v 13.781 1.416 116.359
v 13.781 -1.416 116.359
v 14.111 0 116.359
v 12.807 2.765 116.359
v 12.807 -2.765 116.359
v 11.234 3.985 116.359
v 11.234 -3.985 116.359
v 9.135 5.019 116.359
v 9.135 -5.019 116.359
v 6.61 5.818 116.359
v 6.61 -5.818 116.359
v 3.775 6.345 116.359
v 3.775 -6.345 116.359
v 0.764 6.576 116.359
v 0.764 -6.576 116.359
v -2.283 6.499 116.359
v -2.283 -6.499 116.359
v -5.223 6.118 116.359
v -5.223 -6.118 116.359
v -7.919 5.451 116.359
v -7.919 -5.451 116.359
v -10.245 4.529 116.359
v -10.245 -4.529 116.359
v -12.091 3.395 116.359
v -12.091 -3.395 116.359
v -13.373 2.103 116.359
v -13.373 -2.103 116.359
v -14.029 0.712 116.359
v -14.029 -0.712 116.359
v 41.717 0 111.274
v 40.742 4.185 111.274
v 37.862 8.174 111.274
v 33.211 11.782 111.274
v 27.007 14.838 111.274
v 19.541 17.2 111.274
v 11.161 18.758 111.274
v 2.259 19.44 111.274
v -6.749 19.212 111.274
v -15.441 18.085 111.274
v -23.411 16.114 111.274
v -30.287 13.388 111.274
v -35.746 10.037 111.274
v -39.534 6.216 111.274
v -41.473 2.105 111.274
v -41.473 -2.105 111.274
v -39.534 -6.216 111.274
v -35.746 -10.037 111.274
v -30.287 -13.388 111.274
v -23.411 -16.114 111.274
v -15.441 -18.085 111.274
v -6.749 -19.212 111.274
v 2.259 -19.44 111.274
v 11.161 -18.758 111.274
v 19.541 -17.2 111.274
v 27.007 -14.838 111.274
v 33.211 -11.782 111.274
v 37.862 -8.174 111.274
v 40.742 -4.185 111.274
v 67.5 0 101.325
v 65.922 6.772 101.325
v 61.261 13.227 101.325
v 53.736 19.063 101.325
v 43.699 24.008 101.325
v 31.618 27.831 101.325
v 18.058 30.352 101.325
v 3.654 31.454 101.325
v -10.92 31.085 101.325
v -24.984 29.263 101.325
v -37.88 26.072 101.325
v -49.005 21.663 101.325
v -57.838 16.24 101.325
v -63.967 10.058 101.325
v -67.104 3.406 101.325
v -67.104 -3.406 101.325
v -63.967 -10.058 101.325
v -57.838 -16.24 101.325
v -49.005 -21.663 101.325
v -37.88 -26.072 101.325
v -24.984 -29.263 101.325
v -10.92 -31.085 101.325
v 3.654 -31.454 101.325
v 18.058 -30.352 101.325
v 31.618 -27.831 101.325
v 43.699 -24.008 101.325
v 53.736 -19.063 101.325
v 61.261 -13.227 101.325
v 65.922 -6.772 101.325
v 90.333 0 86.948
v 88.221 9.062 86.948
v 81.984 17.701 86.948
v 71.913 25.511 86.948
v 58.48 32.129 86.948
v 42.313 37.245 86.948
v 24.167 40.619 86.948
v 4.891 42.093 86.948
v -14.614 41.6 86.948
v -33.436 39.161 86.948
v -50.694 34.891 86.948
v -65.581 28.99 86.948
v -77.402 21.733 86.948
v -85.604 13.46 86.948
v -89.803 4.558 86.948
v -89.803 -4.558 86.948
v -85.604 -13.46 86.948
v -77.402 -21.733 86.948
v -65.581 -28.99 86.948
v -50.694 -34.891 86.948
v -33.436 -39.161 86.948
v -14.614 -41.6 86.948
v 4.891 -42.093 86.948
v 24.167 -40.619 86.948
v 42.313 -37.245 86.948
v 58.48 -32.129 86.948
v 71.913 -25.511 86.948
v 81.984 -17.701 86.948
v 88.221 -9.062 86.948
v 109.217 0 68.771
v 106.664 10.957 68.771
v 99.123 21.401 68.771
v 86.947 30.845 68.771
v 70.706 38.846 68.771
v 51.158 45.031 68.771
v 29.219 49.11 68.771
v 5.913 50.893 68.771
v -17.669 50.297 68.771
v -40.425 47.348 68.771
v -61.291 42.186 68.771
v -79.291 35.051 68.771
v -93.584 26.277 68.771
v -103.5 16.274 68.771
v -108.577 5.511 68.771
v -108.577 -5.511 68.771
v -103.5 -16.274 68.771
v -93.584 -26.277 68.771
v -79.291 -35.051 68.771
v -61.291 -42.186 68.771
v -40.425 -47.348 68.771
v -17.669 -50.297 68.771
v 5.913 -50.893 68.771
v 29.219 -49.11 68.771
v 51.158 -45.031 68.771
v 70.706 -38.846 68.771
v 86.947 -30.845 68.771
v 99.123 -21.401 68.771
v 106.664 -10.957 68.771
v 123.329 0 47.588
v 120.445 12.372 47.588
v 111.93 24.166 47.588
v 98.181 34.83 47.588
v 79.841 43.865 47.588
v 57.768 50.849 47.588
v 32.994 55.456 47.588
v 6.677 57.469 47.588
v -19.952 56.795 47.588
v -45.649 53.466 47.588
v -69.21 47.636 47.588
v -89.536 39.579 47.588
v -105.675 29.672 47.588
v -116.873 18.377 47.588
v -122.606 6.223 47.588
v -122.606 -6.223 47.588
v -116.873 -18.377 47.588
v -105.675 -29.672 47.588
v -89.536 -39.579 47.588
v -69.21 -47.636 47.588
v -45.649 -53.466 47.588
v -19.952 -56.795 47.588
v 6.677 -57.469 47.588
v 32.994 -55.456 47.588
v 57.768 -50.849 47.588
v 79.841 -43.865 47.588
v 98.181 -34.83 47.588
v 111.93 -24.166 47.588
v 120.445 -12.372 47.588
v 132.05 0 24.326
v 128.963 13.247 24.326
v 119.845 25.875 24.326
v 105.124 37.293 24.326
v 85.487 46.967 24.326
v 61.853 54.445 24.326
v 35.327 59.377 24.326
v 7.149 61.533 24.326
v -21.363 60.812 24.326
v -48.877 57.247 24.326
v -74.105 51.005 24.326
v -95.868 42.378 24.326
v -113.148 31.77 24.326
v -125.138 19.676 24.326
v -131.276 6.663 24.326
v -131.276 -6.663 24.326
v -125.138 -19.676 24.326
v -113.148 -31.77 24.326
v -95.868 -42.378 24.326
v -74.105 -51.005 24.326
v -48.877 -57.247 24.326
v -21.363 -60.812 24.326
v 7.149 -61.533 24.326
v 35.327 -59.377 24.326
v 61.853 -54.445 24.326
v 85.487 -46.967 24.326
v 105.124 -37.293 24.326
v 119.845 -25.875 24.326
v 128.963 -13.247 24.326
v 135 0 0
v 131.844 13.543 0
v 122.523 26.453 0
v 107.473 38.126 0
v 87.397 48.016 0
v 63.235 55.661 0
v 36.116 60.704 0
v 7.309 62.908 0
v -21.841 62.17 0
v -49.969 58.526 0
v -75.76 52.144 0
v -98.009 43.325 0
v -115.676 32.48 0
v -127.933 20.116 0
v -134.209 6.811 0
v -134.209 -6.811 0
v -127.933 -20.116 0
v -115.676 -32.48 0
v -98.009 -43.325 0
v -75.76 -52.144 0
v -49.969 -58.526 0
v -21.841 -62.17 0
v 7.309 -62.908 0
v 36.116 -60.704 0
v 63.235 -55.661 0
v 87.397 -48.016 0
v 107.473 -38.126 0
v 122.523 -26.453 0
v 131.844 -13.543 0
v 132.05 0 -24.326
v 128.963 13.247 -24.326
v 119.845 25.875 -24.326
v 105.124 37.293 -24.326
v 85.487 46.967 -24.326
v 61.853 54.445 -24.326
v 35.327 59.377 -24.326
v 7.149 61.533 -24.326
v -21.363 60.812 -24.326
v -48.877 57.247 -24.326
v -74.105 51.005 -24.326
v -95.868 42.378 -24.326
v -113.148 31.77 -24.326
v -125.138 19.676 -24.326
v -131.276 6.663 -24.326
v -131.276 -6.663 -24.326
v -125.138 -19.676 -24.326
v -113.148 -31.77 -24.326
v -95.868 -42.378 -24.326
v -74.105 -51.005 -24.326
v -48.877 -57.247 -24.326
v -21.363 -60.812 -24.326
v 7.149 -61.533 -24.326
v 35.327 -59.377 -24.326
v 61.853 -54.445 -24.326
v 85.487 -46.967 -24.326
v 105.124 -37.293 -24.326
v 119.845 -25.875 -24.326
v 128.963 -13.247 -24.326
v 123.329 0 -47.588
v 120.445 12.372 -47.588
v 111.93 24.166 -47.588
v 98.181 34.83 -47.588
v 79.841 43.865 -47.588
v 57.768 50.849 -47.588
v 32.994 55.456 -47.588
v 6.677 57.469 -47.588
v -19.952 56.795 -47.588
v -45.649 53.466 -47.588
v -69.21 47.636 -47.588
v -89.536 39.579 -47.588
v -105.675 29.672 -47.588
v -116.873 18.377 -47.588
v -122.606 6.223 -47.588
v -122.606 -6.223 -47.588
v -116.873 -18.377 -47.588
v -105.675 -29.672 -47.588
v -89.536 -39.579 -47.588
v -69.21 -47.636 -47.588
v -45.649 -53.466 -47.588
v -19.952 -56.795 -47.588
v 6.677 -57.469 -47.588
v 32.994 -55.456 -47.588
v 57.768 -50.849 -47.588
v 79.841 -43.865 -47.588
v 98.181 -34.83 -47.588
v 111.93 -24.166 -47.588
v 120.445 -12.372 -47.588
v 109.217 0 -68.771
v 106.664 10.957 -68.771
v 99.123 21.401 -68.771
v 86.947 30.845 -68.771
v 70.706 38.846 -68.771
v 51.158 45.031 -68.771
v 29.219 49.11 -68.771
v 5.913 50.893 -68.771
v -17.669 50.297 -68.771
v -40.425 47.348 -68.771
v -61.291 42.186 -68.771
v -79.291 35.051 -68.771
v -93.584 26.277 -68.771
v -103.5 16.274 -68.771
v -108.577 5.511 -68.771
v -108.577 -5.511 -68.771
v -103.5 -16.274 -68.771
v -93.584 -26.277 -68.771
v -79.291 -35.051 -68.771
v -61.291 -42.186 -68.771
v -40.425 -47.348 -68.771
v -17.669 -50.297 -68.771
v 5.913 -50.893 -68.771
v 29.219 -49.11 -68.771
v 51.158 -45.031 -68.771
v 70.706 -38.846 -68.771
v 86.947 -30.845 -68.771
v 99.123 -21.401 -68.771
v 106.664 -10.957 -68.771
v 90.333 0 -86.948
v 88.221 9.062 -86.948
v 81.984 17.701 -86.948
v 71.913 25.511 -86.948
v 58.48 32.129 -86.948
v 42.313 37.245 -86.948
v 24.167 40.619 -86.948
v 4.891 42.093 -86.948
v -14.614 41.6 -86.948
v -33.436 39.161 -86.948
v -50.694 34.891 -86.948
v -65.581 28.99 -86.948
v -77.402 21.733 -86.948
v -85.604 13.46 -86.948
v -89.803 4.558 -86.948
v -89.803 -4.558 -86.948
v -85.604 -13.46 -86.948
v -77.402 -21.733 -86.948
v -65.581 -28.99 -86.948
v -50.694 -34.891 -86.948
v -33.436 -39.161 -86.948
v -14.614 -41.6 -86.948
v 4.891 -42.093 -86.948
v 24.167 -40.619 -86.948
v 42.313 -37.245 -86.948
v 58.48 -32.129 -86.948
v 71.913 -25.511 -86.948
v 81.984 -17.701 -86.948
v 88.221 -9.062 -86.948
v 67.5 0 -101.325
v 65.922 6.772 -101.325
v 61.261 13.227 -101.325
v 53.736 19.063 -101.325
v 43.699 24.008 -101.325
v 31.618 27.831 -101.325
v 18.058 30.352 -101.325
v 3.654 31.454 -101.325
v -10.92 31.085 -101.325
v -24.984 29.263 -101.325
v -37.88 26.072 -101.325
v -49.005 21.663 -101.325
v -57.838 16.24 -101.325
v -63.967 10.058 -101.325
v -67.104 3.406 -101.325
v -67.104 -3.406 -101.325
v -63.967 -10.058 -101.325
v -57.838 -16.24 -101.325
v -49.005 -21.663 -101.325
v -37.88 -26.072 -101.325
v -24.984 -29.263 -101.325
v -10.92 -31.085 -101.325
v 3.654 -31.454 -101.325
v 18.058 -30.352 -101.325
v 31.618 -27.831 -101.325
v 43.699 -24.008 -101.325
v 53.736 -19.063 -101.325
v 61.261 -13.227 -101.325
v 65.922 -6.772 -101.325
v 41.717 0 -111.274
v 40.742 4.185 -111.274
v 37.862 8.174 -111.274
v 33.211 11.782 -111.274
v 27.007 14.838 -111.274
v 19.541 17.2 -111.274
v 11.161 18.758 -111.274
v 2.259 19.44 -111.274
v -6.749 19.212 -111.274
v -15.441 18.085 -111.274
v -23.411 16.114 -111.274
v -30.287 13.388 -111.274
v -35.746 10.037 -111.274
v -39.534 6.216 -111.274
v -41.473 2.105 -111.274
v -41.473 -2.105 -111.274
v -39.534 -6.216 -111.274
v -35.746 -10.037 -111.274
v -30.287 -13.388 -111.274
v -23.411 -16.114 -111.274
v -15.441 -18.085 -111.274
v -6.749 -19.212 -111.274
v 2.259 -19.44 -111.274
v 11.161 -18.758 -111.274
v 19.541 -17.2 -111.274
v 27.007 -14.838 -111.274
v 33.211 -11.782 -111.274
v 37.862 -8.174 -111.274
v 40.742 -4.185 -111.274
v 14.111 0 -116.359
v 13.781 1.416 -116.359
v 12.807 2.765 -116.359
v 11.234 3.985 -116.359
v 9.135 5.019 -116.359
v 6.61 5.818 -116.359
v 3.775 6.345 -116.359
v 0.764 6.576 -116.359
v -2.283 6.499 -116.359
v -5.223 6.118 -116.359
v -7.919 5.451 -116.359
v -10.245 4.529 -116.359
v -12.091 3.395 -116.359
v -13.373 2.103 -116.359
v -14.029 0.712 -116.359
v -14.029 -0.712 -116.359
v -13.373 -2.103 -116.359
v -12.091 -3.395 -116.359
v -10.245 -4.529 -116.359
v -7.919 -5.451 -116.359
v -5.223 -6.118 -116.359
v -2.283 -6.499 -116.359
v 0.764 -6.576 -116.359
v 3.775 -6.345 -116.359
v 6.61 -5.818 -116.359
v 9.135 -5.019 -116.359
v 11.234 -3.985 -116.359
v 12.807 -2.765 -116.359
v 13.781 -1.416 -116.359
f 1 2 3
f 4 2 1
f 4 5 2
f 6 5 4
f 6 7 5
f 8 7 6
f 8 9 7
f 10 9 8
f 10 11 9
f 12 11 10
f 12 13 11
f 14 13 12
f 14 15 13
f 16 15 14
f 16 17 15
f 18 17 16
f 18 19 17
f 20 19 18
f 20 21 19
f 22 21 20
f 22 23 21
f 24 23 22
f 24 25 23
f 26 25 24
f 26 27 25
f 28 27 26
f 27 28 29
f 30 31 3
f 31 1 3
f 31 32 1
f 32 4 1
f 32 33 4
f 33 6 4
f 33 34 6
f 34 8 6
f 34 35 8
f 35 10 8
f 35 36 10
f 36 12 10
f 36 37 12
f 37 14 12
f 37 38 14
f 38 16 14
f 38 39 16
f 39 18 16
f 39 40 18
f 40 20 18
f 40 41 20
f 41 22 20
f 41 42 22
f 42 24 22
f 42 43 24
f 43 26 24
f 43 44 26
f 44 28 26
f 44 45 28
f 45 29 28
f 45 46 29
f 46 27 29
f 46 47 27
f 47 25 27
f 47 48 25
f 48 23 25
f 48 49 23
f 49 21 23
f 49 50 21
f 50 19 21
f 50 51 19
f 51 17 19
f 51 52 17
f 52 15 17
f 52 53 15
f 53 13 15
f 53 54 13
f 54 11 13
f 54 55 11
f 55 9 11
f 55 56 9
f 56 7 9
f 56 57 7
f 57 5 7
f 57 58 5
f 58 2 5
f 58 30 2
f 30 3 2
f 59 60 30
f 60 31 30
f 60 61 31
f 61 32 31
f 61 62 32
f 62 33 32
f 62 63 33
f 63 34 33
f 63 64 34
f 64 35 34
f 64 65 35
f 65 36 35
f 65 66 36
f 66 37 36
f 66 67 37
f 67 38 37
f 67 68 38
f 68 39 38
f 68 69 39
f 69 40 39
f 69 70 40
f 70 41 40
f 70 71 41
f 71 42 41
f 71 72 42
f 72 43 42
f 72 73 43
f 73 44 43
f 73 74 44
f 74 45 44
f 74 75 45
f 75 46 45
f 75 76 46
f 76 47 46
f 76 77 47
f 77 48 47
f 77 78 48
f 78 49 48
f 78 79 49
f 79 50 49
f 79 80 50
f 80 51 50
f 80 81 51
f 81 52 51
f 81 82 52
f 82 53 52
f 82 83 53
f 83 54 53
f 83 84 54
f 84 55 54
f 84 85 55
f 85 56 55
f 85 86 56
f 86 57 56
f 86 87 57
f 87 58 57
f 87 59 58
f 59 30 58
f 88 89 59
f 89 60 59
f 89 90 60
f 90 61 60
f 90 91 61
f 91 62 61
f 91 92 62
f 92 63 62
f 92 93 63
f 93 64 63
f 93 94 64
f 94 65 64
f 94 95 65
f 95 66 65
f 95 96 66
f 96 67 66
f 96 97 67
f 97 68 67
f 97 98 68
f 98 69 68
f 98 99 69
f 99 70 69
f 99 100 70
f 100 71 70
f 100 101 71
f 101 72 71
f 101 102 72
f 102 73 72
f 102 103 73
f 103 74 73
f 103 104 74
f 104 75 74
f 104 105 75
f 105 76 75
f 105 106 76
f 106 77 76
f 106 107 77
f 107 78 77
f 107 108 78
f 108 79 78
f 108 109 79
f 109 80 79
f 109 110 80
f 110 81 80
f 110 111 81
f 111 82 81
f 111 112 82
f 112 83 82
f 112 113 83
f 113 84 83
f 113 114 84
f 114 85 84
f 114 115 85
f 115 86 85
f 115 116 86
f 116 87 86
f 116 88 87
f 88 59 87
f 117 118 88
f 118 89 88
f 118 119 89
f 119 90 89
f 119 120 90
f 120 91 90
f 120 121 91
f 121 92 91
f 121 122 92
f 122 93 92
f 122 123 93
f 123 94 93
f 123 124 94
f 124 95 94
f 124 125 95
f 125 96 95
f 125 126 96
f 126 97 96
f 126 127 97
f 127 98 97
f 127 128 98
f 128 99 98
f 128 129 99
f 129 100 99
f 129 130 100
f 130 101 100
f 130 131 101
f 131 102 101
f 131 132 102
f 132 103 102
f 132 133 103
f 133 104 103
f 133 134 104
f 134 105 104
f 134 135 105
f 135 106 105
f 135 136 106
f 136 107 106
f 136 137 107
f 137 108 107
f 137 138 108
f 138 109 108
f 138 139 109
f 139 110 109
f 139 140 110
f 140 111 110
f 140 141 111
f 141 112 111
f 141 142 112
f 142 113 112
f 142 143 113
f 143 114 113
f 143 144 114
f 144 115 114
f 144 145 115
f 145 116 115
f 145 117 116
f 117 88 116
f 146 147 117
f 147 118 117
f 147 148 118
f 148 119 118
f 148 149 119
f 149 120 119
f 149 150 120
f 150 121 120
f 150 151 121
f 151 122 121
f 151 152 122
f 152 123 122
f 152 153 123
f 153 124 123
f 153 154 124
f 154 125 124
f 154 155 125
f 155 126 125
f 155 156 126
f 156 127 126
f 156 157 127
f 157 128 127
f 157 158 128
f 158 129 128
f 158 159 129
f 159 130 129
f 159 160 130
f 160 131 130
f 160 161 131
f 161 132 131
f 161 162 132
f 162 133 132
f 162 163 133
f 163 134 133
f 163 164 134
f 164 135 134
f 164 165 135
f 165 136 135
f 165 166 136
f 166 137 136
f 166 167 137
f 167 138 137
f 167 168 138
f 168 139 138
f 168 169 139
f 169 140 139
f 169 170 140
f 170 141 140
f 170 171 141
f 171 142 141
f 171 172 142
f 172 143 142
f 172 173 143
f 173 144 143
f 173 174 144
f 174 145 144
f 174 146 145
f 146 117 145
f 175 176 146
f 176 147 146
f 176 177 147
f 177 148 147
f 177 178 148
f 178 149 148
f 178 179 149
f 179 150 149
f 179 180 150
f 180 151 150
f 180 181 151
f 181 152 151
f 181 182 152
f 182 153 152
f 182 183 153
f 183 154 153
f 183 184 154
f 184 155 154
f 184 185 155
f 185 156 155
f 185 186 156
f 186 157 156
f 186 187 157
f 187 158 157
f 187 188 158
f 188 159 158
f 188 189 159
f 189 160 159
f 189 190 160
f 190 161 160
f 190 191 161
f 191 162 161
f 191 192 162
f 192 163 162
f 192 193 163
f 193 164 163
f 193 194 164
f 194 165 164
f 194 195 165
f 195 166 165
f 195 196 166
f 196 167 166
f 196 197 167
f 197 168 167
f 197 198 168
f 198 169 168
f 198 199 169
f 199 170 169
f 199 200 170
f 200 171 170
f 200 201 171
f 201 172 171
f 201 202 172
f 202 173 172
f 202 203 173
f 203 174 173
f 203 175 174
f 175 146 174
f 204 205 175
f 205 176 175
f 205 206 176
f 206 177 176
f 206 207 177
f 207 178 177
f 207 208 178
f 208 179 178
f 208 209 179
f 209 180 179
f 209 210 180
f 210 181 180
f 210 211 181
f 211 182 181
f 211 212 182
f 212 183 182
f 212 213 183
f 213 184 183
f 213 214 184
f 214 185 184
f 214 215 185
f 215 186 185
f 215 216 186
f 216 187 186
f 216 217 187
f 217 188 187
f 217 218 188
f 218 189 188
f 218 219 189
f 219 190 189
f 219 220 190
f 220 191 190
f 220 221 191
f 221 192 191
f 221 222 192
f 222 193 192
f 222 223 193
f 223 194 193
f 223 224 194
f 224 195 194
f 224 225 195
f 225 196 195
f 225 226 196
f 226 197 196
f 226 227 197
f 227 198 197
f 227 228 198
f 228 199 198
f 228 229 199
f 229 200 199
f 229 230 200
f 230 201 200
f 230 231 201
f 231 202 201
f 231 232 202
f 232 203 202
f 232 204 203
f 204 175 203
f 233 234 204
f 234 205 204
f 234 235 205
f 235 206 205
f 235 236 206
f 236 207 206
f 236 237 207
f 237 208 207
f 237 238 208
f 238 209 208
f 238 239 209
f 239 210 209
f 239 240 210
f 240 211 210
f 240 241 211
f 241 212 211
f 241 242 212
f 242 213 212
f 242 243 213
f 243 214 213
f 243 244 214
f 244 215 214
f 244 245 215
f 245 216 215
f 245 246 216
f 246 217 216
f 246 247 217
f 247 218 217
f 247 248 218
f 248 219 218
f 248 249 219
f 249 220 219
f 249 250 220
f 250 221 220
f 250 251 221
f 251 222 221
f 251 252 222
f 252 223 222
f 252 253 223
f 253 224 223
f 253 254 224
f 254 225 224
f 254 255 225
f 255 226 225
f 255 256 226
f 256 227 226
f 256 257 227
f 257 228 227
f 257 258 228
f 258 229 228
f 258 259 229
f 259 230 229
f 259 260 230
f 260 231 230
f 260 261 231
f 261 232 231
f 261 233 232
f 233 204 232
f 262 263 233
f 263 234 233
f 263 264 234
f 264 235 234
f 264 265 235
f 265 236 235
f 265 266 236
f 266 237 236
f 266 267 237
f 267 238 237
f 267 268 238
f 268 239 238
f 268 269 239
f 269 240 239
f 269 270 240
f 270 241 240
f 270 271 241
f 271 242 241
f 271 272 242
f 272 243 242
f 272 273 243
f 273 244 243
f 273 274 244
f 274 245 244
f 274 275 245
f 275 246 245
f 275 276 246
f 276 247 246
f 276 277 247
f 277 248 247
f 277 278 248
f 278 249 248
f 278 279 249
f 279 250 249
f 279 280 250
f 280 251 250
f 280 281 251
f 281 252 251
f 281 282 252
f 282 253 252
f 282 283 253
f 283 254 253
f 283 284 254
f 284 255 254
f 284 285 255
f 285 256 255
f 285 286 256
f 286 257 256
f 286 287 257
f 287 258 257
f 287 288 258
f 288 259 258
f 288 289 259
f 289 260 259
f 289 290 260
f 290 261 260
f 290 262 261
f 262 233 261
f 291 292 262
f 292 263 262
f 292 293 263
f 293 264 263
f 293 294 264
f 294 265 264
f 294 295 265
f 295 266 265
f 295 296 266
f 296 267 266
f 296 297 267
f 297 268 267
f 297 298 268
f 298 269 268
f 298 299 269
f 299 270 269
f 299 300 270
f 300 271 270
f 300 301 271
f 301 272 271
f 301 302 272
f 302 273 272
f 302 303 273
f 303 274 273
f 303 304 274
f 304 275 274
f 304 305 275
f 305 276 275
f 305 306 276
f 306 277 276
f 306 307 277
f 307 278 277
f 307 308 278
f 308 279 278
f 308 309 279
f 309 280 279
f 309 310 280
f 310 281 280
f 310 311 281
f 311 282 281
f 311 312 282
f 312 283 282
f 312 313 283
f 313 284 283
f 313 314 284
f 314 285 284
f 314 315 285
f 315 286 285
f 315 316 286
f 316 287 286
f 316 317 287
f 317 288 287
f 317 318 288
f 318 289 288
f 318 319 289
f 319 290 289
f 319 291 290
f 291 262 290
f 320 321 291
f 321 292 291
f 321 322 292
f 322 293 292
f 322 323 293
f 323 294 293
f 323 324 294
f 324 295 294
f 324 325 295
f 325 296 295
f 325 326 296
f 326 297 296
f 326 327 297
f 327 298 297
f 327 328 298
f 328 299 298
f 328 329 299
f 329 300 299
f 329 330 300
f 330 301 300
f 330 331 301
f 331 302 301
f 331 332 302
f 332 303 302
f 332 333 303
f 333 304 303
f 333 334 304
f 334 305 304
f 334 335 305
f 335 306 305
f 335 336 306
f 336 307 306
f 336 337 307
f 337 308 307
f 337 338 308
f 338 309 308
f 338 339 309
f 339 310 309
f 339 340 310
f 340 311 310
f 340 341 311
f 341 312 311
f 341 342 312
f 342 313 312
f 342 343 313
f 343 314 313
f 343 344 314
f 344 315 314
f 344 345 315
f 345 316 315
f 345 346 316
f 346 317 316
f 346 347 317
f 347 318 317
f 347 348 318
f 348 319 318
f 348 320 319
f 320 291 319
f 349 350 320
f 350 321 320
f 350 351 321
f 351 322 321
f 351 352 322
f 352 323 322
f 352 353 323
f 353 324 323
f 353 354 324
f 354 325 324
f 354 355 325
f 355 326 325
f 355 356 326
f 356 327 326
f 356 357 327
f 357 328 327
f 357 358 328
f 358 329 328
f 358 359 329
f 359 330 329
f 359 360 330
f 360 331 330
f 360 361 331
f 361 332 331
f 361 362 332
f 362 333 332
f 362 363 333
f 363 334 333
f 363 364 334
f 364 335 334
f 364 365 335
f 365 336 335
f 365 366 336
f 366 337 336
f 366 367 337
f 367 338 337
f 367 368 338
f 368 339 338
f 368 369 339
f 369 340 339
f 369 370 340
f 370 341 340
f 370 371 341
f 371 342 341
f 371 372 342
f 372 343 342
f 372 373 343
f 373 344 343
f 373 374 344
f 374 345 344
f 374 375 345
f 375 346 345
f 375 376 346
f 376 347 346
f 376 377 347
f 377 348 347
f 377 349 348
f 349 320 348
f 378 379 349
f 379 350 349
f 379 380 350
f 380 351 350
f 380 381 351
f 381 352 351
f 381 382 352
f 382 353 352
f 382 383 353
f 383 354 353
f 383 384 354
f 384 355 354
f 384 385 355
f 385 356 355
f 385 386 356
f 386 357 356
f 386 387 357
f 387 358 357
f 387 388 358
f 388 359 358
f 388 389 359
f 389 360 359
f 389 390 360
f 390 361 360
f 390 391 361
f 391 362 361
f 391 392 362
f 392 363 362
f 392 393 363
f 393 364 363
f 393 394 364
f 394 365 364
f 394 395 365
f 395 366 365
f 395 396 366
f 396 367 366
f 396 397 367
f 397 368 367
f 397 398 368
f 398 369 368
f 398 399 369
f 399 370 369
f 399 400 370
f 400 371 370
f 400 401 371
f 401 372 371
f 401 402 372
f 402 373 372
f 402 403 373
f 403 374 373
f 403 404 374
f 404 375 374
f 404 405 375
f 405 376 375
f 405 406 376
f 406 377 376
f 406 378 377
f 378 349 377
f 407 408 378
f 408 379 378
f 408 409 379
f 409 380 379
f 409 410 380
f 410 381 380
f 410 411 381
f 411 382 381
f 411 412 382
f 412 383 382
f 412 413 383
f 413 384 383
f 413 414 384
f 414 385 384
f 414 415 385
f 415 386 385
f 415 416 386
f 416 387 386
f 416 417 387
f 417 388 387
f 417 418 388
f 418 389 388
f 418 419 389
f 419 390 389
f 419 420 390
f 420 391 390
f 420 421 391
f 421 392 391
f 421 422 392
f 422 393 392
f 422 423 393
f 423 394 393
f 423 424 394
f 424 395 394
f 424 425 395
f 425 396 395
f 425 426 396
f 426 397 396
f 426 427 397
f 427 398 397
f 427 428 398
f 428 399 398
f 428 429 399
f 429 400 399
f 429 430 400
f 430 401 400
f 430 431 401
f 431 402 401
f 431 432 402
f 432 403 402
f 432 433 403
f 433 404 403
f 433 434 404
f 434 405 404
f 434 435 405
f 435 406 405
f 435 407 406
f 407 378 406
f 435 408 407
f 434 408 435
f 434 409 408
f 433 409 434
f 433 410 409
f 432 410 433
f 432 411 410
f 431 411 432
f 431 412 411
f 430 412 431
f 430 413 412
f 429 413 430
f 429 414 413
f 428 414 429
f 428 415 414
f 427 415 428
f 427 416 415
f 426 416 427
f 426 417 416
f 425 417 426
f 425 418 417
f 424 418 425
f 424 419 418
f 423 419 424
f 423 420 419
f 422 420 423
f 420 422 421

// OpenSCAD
// Generated by SolidPython 1.0.1 on 2020-07-29 00:46:51


scale(v = [15, 7, 13]) {
	sphere(r = 9);
}
/***********************************************
*********      SolidPython code:      **********
************************************************
 
# import packages: SolidPython
from solid import *
from solid.utils import *
from itertools import chain, combinations, permutations


class Resize:

    def __init__(self, scad_file):
        self.scad_file = scad_file
        #self.scad_file = import_scad(scad_file)
        # cone/cylinder param:
        self.r1 = 0
        self.r2 = 0
        self.h = 0
        # rectangular prism param:
        self.w = 0
        self.l = 0
        # ellipse param:
        self.r = 0

    # import OpenScad code (file name corresponds to shape)


    # classify shape + parameters
    def assign(self, param1, param2, param3):
        if self.scad_file == 'cone.scad':
            self.r1 = param1
            self.r2 = param2
            self.h = param3
        elif self.scad_file == 'cylinder.scad':
            self.r1 = param1
            self.r2 = param2
            self.h = param3
        elif self.scad_file == 'rectangularPrism.scad':
            self.h = param1
            self.l = param2
            self.w = param3
        else:
            self.r = param1
            self.h = param2

    # resize parameters
    def iterate(self):
        x = range(3, 20, 2)
        i = 1
        if self.scad_file == 'cone.scad':
            tempList = list(permutations(x, 2))
            for temp in tempList:
                param1 = temp[0]
                param2 = temp[1]
                filepath = 'produced_scad_files/' + 'cone' + str(param1) + '_' + str(param2) + '_' + '.scad'
                scad_render_to_file(cylinder(h=param1, r1=param2, r2=0), filepath)

        elif self.scad_file == 'cylinder.scad':
            tempList = list(permutations(x, 3))
            for temp in tempList:
                param1 = temp[0]
                param2 = temp[1]
                filepath = 'produced_scad_files/' + 'cylinder' + str(param1) + '_' + str(param2) + '_' + '.scad'
                scad_render_to_file(cylinder(h=param1, r1=param2, r2=param2), filepath)

        elif self.scad_file == 'rectangularPrism.scad':
            tempList = list(permutations(x, 3))
            for temp in tempList:
                param1 = temp[0]
                param2 = temp[1]
                param3 = temp[2]
                filepath = 'produced_scad_files/' + 'rectangularPrism' + str(param1) + '_' + str(param2) + '_' + str(
                    param3) + '.scad'
                scad_render_to_file(cube(size=(param1, param2, param3)), filepath)

        elif self.scad_file == 'ellipse.scad':
            tempList = list(permutations(x, 4))
            for temp in tempList:
                param1 = temp[0]
                param2 = temp[1]
                param3 = temp[2]
                param4 = temp[3]
                filepath = 'produced_scad_files/' + 'ellipse' + str(param1) + '_' + str(param2) + '_' + str(param3) + '_' + str(param4) + '.scad'
                scad_render_to_file(scale([param1, param2, param3])(sphere(r=param4)), filepath)

    def render_to_scadfile(self):
        scad_render_to_file(scad, 'example.scad') 
 
************************************************/
